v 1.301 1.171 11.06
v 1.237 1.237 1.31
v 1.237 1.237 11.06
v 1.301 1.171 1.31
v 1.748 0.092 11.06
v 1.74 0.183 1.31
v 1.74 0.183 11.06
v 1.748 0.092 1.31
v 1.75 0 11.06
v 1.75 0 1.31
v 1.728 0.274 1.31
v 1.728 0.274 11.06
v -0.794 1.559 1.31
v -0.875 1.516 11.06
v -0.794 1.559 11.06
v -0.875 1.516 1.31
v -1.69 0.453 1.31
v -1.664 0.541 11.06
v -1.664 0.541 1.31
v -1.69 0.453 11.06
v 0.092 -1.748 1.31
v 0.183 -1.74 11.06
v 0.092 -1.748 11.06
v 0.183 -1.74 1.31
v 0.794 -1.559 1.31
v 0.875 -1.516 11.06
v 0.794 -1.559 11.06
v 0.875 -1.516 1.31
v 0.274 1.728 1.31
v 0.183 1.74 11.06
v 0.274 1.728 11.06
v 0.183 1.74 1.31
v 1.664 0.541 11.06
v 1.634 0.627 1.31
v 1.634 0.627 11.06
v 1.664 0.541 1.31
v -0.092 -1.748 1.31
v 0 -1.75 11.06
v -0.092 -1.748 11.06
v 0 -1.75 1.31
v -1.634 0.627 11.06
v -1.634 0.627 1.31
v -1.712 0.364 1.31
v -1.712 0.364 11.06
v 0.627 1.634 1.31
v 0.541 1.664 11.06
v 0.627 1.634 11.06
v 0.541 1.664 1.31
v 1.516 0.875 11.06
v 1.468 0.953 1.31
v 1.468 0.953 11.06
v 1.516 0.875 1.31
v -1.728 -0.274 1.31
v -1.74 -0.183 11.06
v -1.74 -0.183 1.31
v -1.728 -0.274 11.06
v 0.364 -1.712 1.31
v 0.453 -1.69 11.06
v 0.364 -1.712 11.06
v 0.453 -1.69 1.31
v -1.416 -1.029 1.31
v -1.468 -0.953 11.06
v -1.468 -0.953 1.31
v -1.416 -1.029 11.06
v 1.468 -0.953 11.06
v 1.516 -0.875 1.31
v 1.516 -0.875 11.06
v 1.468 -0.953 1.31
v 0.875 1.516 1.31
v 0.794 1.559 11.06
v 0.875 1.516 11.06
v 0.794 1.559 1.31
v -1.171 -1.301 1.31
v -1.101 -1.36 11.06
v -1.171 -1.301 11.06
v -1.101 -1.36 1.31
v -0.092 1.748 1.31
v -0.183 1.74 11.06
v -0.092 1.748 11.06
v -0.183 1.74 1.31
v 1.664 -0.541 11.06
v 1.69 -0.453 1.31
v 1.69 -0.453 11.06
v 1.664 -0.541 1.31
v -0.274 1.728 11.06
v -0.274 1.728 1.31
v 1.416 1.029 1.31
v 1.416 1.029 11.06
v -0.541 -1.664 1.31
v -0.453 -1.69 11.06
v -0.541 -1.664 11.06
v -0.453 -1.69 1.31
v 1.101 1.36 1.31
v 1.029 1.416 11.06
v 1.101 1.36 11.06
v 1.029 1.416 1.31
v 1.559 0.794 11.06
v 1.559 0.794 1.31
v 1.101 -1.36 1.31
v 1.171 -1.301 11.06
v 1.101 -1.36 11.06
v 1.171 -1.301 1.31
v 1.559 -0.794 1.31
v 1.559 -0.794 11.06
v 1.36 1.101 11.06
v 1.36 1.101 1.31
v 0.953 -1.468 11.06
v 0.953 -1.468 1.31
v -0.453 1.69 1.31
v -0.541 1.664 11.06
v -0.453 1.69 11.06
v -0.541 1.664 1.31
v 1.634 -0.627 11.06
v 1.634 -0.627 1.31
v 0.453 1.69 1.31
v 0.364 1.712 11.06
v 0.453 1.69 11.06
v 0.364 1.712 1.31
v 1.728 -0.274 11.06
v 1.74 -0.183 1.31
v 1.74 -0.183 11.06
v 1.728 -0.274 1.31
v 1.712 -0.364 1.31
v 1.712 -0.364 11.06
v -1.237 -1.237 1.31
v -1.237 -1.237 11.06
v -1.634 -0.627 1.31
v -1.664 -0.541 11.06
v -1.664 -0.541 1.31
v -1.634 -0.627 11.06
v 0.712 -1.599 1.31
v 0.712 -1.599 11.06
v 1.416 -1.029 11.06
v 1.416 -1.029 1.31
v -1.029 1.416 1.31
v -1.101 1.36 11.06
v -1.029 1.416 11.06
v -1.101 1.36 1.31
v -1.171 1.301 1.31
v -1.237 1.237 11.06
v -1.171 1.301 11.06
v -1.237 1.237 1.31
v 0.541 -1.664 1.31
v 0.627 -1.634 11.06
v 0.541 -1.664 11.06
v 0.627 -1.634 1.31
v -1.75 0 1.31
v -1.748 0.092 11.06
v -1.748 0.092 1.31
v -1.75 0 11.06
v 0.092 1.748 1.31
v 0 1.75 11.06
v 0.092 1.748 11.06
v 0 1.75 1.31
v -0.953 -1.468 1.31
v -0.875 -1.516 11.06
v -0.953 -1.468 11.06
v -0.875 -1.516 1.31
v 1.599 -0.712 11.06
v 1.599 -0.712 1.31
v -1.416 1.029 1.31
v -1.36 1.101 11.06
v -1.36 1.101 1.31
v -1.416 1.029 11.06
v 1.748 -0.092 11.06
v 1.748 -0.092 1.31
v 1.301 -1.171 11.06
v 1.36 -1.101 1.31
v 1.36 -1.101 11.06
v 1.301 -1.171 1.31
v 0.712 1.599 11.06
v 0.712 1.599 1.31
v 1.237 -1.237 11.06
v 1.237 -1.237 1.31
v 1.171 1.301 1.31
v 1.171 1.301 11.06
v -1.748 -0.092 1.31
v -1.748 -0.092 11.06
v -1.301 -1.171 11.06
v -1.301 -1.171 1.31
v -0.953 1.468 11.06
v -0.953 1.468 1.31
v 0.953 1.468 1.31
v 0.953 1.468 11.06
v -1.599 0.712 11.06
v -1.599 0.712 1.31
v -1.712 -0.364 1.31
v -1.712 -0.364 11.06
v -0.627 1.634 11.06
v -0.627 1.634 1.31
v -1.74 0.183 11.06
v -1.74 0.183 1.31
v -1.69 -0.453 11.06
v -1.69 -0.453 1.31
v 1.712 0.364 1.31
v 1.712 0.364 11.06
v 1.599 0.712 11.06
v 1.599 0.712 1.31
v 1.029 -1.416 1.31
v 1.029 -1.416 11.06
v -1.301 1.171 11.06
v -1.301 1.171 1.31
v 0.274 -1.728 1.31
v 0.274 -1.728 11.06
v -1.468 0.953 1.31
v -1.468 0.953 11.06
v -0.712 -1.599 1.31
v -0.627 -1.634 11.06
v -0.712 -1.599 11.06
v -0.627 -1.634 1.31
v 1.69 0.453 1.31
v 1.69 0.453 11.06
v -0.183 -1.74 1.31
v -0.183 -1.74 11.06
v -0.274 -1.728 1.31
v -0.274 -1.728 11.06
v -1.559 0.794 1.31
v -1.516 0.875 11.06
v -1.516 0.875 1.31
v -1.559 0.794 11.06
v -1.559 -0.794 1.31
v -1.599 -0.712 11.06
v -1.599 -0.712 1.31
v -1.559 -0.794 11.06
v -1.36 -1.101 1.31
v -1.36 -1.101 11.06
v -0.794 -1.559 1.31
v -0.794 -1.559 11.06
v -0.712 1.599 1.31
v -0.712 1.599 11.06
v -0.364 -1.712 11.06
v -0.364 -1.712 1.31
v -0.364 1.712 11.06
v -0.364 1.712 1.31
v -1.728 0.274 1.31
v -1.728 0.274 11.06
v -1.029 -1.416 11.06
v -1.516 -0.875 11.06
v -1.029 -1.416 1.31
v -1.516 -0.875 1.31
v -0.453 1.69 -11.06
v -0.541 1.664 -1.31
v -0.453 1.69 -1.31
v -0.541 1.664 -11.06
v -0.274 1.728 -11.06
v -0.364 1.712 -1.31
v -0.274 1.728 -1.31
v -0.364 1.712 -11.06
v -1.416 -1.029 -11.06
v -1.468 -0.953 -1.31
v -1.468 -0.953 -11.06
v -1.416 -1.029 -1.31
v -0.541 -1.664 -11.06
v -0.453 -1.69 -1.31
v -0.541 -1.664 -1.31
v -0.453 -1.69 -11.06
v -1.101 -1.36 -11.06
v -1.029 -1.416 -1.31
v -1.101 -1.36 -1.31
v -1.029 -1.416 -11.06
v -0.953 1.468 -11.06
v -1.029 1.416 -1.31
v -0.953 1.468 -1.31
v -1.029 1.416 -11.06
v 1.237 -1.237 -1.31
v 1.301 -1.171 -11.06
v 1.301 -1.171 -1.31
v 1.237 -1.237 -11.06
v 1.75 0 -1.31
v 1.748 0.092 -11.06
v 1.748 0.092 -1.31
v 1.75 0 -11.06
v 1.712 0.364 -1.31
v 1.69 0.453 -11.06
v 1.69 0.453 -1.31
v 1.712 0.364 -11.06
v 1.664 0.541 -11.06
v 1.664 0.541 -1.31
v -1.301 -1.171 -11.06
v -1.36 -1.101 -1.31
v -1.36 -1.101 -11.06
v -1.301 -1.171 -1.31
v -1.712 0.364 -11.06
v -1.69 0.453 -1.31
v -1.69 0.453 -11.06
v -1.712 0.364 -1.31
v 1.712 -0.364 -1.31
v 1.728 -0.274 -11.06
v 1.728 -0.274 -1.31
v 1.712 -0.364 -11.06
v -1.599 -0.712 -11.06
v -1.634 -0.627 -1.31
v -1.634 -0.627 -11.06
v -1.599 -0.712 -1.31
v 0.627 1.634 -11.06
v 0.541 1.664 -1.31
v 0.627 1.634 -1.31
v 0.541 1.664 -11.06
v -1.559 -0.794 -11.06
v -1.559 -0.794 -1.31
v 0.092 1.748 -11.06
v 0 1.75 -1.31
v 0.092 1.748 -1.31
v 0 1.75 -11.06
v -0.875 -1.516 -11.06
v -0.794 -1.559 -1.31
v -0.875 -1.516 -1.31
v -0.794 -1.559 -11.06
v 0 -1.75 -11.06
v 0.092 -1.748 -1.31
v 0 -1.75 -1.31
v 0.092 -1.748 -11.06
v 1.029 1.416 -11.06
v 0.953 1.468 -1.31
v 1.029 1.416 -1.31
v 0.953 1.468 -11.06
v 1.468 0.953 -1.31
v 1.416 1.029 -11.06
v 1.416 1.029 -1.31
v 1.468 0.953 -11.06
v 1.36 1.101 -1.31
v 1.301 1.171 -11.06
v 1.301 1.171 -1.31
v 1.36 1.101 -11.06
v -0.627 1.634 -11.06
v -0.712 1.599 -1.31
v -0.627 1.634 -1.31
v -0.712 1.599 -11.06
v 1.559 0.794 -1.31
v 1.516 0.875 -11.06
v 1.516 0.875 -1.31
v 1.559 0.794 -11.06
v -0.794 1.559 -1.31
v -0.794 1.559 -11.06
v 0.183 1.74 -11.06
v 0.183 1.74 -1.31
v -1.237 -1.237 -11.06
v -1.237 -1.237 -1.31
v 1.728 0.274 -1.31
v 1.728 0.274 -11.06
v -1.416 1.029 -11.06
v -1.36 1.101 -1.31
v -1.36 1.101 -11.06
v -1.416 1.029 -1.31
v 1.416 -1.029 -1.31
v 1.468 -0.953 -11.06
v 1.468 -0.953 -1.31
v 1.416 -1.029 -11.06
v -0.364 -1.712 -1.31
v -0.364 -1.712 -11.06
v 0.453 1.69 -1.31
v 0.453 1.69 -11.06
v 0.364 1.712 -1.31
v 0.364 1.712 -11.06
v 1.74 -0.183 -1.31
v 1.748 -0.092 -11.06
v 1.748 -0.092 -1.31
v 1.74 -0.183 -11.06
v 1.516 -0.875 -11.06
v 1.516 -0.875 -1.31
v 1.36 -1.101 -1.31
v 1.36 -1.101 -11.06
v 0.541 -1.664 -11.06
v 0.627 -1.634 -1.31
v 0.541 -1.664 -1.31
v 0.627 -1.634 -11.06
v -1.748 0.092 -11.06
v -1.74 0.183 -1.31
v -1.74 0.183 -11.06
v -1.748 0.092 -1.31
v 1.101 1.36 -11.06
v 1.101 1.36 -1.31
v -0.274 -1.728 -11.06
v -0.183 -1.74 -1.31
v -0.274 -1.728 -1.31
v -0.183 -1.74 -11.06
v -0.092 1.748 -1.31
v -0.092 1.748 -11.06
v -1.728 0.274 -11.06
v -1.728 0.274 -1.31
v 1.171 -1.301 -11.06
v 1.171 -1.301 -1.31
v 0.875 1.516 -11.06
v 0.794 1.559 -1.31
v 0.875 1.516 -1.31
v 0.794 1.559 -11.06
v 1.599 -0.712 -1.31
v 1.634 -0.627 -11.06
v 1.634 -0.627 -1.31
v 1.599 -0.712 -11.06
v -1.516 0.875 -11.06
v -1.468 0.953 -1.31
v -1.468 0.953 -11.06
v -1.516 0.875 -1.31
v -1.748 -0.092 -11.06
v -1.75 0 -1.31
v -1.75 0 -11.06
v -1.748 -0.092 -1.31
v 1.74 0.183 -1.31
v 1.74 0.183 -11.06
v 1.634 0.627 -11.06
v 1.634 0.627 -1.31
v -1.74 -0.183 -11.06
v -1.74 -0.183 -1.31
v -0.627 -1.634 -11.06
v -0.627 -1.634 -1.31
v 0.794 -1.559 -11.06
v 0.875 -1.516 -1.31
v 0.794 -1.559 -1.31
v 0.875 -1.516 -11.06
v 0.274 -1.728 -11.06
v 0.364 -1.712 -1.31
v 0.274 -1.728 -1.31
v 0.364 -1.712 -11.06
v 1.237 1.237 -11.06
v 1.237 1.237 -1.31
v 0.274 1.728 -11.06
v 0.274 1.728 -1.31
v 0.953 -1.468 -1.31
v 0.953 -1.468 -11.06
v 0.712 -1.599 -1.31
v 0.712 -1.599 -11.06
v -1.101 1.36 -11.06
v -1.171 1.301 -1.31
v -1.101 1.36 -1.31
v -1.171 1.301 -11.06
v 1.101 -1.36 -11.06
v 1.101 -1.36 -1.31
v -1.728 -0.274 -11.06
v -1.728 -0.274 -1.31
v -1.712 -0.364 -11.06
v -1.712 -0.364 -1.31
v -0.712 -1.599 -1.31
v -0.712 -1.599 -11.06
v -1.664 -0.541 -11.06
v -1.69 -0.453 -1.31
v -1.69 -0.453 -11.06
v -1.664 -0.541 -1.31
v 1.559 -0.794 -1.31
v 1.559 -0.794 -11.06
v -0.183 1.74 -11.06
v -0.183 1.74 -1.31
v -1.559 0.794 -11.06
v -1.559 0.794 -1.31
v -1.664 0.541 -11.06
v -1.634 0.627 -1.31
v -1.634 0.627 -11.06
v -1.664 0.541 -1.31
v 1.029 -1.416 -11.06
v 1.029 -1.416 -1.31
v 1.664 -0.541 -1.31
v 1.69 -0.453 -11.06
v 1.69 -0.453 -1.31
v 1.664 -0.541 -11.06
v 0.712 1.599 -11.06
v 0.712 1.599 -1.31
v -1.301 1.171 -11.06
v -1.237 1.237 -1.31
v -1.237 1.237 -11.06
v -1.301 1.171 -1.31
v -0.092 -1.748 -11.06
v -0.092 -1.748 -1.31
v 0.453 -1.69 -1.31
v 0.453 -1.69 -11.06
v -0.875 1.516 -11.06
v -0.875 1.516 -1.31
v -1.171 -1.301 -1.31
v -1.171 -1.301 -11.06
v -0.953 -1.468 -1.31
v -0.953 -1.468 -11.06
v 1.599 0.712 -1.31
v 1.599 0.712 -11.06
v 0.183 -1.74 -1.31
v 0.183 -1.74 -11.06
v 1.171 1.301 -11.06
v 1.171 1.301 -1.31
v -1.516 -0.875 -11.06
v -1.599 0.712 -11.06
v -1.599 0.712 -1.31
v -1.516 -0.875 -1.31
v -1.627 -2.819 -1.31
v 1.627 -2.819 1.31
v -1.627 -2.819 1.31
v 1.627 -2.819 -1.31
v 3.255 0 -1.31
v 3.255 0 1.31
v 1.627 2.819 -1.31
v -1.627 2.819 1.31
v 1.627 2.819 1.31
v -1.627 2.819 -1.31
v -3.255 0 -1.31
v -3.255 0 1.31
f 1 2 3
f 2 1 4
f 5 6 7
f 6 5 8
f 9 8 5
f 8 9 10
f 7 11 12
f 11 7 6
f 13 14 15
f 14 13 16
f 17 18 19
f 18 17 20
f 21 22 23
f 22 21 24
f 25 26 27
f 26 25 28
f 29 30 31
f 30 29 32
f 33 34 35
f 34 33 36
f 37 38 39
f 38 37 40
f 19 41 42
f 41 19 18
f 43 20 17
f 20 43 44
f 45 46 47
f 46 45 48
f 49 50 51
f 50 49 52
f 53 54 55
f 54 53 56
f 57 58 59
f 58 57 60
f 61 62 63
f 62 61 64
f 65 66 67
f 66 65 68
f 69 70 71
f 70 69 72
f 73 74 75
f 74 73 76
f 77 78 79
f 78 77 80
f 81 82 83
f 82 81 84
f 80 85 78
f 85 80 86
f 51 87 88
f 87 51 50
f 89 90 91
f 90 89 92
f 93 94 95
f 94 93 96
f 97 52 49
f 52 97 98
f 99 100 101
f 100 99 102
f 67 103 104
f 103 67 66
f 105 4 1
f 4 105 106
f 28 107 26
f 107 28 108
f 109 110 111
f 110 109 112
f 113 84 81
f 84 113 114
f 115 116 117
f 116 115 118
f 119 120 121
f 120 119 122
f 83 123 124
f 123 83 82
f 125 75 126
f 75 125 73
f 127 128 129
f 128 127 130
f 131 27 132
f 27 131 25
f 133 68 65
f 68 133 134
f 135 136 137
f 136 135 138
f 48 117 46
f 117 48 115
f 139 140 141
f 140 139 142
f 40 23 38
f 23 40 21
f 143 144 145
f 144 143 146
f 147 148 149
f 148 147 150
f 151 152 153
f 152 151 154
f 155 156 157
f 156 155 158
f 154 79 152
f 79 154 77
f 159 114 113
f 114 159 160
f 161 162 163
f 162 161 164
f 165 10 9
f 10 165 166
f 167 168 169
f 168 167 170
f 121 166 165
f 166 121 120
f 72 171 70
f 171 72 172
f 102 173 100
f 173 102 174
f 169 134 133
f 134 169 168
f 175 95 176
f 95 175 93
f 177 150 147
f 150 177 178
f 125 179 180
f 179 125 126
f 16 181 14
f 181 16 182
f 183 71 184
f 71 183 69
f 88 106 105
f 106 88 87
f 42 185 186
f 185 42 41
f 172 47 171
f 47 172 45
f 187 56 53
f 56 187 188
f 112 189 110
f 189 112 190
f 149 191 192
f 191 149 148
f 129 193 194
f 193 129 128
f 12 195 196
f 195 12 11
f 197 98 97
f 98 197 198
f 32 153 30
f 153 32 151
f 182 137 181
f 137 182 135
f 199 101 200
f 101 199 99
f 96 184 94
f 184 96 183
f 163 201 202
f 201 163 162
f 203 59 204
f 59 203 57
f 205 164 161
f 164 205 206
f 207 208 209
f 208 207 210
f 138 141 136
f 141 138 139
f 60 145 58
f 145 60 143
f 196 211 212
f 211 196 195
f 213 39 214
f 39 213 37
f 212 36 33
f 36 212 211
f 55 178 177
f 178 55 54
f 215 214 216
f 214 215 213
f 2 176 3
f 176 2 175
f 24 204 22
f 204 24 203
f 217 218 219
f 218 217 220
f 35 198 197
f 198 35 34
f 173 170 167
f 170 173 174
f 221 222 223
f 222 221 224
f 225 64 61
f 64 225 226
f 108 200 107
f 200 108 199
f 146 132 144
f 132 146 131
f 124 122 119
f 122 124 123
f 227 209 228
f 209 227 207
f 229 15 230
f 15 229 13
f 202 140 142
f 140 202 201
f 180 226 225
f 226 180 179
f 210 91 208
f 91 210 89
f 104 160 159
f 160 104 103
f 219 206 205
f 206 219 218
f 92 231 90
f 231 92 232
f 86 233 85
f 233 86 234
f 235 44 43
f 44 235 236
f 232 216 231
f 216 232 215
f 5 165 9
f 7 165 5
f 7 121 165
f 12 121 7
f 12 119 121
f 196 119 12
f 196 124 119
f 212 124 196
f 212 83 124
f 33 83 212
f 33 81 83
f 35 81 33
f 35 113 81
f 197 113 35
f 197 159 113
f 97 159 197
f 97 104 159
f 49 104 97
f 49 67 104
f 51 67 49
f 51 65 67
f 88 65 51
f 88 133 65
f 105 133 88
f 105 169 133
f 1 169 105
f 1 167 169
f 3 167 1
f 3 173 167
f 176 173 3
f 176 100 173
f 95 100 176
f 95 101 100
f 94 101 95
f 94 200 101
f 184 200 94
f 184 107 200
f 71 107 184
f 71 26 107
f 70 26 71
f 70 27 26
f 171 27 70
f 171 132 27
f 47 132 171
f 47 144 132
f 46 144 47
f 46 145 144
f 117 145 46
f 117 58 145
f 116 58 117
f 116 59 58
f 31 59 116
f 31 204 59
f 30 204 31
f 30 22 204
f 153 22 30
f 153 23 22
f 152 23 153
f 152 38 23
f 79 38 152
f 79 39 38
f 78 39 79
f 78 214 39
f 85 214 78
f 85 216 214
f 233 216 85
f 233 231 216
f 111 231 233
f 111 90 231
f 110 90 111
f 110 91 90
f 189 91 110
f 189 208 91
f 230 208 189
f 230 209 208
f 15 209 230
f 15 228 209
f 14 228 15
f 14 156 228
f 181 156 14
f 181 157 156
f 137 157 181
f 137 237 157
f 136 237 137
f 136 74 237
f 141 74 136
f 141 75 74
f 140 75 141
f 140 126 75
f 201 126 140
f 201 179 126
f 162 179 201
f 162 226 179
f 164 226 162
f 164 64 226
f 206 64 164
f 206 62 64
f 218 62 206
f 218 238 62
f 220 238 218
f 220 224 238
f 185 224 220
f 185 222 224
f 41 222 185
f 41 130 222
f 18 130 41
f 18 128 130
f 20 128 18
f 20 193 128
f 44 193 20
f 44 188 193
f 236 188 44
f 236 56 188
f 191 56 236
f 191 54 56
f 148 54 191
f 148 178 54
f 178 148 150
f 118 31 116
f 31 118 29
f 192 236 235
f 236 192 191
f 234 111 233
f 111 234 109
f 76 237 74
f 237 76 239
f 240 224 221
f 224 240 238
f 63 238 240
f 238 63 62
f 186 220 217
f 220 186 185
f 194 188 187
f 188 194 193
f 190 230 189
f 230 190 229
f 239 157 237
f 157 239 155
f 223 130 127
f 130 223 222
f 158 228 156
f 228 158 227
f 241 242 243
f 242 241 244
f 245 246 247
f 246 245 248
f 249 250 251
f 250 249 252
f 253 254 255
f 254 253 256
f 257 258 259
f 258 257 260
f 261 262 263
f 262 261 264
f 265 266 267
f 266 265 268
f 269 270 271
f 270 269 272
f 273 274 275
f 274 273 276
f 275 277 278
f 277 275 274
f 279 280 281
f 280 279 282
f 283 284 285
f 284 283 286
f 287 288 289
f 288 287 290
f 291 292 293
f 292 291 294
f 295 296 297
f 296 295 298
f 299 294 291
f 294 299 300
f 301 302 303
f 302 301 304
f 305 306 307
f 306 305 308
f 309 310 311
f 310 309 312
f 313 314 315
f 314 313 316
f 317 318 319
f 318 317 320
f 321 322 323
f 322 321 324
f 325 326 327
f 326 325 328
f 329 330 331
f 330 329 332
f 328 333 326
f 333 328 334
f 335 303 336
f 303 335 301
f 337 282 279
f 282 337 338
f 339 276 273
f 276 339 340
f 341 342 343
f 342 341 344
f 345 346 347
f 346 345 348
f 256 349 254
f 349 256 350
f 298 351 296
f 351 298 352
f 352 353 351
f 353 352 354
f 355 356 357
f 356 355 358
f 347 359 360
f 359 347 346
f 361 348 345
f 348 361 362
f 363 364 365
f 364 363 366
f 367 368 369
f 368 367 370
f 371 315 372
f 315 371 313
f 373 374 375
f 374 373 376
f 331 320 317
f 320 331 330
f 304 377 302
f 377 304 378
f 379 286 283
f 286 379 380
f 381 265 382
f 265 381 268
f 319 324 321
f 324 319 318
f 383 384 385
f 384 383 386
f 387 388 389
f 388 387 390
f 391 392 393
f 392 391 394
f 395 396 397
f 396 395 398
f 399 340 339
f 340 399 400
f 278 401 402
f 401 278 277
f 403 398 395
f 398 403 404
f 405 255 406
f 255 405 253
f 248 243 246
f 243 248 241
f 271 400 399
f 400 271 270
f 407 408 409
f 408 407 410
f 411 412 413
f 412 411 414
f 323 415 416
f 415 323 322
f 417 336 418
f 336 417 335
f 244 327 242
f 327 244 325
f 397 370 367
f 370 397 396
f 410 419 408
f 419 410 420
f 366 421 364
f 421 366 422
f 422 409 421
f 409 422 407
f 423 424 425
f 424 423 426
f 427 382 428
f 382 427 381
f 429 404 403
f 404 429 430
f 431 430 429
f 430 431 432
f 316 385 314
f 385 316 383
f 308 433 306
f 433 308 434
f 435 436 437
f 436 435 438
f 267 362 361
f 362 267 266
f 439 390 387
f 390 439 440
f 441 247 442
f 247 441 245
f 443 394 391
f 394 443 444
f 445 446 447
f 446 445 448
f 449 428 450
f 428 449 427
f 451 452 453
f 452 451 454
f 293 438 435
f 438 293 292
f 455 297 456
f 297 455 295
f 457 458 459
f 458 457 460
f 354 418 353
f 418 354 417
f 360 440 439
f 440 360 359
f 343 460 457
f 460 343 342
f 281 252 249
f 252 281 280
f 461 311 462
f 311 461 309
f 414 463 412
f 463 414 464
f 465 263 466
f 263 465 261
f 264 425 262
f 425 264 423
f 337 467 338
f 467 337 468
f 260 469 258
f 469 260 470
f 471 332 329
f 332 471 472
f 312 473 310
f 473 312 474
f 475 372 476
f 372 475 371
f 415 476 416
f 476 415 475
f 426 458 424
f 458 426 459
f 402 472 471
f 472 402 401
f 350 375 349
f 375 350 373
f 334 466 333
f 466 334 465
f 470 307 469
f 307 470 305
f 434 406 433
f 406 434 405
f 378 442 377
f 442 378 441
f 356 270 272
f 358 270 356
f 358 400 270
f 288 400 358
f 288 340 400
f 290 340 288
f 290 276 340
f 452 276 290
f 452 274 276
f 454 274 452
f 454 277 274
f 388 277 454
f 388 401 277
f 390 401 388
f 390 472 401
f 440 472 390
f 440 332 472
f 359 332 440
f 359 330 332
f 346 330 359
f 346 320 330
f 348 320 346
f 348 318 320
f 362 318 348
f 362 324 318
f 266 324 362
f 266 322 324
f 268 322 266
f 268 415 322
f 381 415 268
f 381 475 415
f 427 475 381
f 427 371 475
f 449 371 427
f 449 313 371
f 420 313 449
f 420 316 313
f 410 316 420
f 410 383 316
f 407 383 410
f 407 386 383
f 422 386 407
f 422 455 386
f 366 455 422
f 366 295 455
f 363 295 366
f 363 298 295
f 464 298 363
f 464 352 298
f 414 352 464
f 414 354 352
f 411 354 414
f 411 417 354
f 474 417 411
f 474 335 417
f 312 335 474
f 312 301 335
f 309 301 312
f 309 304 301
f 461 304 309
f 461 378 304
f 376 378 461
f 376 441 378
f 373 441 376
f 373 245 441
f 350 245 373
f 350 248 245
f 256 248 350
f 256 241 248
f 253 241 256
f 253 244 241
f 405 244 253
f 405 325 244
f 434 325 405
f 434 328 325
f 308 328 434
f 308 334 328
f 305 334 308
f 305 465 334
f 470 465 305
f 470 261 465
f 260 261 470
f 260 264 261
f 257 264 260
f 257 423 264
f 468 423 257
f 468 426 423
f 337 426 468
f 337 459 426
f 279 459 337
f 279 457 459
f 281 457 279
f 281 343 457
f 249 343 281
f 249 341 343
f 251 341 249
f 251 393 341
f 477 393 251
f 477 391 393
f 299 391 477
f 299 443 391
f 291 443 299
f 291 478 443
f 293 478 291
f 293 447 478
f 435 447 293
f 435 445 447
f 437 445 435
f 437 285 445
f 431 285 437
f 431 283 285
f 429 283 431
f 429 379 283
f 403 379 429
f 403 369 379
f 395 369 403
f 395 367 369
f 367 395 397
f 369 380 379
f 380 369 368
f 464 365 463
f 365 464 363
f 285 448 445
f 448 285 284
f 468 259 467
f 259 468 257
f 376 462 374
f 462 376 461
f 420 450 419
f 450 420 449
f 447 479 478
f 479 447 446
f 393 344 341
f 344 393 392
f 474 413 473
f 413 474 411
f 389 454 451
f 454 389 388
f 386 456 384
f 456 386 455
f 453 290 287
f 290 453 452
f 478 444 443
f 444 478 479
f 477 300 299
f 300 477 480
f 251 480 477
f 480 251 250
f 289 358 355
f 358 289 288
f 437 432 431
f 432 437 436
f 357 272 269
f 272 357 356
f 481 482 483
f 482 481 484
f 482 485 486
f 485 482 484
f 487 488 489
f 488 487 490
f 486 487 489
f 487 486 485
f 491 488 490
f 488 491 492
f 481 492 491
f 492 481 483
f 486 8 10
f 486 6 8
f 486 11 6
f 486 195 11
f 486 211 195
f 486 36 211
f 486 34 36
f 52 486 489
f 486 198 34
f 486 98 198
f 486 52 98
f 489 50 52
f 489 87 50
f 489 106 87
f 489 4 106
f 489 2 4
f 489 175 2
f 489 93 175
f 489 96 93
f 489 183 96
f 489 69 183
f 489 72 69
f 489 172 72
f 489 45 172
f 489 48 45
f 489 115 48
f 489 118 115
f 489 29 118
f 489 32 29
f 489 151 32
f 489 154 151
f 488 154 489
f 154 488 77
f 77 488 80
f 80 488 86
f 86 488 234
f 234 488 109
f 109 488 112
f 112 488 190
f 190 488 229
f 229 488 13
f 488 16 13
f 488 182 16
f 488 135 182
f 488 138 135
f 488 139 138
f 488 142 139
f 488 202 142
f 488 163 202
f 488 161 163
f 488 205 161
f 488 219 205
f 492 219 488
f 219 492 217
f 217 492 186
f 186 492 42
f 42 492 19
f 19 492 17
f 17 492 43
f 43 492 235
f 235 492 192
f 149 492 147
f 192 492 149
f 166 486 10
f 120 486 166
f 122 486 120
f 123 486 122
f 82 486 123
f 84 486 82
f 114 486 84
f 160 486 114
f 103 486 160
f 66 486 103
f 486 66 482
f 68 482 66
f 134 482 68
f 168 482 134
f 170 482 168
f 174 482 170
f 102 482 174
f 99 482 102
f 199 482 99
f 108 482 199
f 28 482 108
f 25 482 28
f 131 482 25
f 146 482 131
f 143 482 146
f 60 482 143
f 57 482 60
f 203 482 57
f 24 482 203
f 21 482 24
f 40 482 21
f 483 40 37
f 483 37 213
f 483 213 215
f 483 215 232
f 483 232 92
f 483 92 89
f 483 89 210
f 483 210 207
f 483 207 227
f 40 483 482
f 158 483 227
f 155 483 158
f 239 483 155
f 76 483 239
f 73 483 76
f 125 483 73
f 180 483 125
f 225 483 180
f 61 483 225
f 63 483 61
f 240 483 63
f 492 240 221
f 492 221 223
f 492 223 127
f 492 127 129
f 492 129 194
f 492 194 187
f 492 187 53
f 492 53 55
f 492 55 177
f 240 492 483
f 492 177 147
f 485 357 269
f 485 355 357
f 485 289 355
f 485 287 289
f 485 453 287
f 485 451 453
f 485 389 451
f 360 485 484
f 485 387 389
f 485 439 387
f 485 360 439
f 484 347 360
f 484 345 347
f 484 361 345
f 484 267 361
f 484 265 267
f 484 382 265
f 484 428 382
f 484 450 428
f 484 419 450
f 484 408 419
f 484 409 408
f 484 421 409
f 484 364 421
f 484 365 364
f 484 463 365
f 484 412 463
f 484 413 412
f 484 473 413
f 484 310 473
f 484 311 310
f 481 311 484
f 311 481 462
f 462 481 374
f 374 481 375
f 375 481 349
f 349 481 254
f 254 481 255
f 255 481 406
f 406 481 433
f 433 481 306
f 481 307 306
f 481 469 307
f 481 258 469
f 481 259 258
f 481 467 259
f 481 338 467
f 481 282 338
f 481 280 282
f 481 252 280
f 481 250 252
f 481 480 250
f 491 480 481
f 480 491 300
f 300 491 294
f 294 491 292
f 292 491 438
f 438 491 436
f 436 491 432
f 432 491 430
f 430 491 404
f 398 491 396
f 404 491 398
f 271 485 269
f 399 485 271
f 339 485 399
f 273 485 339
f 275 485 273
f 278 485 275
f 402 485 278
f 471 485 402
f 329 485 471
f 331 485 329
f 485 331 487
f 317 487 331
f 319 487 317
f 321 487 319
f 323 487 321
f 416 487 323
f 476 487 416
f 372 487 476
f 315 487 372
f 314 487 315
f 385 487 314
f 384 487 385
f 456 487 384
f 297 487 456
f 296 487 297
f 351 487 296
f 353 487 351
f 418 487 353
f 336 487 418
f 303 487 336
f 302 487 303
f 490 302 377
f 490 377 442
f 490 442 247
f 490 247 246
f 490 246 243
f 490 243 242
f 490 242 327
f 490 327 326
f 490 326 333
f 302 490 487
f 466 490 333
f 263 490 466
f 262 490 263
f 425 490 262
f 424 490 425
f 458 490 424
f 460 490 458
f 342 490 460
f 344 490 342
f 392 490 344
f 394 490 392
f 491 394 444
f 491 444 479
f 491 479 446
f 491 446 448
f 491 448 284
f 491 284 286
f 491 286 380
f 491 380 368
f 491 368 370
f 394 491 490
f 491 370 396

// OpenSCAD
/////////////////////////////////////////////
//////////////// VARIABLES
/////////////////////////////////////////////

/////INTERNAL VARIABLES

/*
Diameter Sizes: 

    MUST BE DEFINED FIRST

[Diameter of bolt, 
    Diameter of nut = MAX,
    Depth of the nut - MAX]
*/

//ignore variable values
M3 = [3, 6.01, 2.12]*1;  //*1 is to hide the variables from Customizer
M4 = [4, 7.66, 2.92]*1; 
M5 = [5, 8.79, 3.65]*1; 
M6 = [6, 11.05, 4.15]*1; 
M7 = [7, 12.12, 4.95]*1;
M8 = [8, 14.38, 5.45]*1;
M10 = [10, 18.9, 6.56]*1;
M12 = [12, 21.1, 7.68]*1;
M14 = [14, 24.49, 8.98]*1;
M16 = [16, 26.75, 10.18]*1;
M18 = [18, 30.14, 11.72]*1;
M20 = [20, 33.53, 12.72]*1;
M22 = [22, 35.72, 14.22]*1;
M24 = [24, 39.98, 15.22]*1;
M27 = [27, 45.2, 17.35]*1;
M30 = [30, 50.85, 19.12]*1;
M33 = [33, 55.37, 21.42]*1;
M36 = [36, 60.79, 22.92]*1;
M39 = [39, 66.44, 25.43]*1;
M42 = [42, 71.3, 26.42]*1;
M45 = [45, 76.95, 28.42]*1;
M48 = [48, 82.60, 30.42]*1;

//FOR TESTING
exploded = 0*1;
res = 1*120;

////////////////////////EXTERNAL VARIABLES


//Metric Bolt Type
user_bolt_type = "M3"; //[M3, M4, M5, M6, M7, M8, M10, M12, M14, M16, M18, M20, M22, M24, M27, M30, M33, M36, M39, M42, M45, M48]

//Render the full bolt, just the head or a hex head with a bolt protuding from both ends:
show = "through"; //[full, through, head]

// Tolerance Adjustment in mm - increase to account for material shrinkage - 0.5 is a good start for ABS: 
tolerance = 0.5; //[0: 0.1: 2.0]

//Manually set bolt length in mm (over-rides the standard multiplier below): 
manual_bolt_length = 10;

//Length of bolt x bolt head size multiplier: 
bolt_length_multiplier = 2; //[0:0.5:10]

//Extra Hex Head depth in mm (over standard):
extra_head_depth = 0; //[0:0.25:50]


//Multiplier for through value:
bolt_length_through = bolt_length_multiplier * 2; //MUST follow other variables.




/////////////////////////////////////////////
//////////////// RENDERS
/////////////////////////////////////////////

bolt_type_if_statements();


/////////////////////////////////////////////
//////////////// MODULES
/////////////////////////////////////////////



//renders the final bolt dependant on what display variable is set
module final(h_l, h_s, b_s){
b_l = b_s * bolt_length_multiplier;
head(h_l, h_s);
if (show != "head"){

    if(show == "through"){

            bolt_blank(b_l, b_s, h_l);
            mirror([0,0,1]){
                bolt_blank(b_l, b_s, h_l);
                }
            }
            
    else {
        bolt_blank(b_l, b_s, h_l);
        }
}
}

//generates the bolt's HEX head
module head(h_l, h_s){

cylinder(h = h_l + tolerance + extra_head_depth, d = h_s + tolerance, center = true, $fn = 6);

}

//handles positioning of the blank dependant on whether a manual bolt length is selected or not, among other factors
module bolt_blank(b_l, b_s, h_l){
    
    if (manual_bolt_length != 0){
        translate([0,0,(h_l/2)+(manual_bolt_length/2)+exploded + (extra_head_depth/2)]){
    blank_a(manual_bolt_length, b_s);
    
        }
    }
    
    else {
    translate([0,0,(h_l/2)+(b_l/2)+exploded + (extra_head_depth/2)]){
    blank_a(b_l, b_s);
    }
    
    }
}

//Main blank for the circular bolt section
module blank_a(b_l, b_s){
    
        cylinder(h = b_l, d = b_s + tolerance, center = true, $fn = res);
}


//Handles the different bolt types that could be selected
module bolt_type_if_statements(){

if (user_bolt_type == "M3"){
final(M3[2], M3[1], M3[0]);
}

if (user_bolt_type == "M4"){
final(M4[2], M4[1], M4[0]);
}

if (user_bolt_type == "M5"){
final(M5[2], M5[1], M5[0]);
}

if (user_bolt_type == "M6"){
final(M6[2], M6[1], M6[0]);
}

if (user_bolt_type == "M7"){
final(M7[2], M7[1], M7[0]);
}

if (user_bolt_type == "M8"){
final(M8[2], M8[1], M8[0]);
}

if (user_bolt_type == "M10"){
final(M10[2], M10[1], M10[0]);
}

if (user_bolt_type == "M12"){
final(M12[2], M12[1], M12[0]);
}

if (user_bolt_type == "M14"){
final(M14[2], M14[1], M14[0]);
}

if (user_bolt_type == "M16"){
final(M16[2], M16[1], M16[0]);
}

if (user_bolt_type == "M18"){
final(M18[2], M18[1], M18[0]);
}

if (user_bolt_type == "M20"){
final(M20[2], M20[1], M20[0]);
}

if (user_bolt_type == "M22"){
final(M22[2], M22[1], M22[0]);
}

if (user_bolt_type == "M24"){
final(M24[2], M24[1], M24[0]);
}

if (user_bolt_type == "M27"){
final(M27[2], M27[1], M27[0]);
}

if (user_bolt_type == "M30"){
final(M30[2], M30[1], M30[0]);
}

if (user_bolt_type == "M33"){
final(M33[2], M33[1], M33[0]);
}

if (user_bolt_type == "M36"){
final(M36[2], M36[1], M36[0]);
}

if (user_bolt_type == "M39"){
final(M39[2], M39[1], M39[0]);
}

if (user_bolt_type == "M42"){
final(M42[2], M42[1], M42[0]);
}

if (user_bolt_type == "M45"){
final(M45[2], M45[1], M45[0]);
}

if (user_bolt_type == "M48"){
final(M48[2], M48[1], M48[0]);
}
}
